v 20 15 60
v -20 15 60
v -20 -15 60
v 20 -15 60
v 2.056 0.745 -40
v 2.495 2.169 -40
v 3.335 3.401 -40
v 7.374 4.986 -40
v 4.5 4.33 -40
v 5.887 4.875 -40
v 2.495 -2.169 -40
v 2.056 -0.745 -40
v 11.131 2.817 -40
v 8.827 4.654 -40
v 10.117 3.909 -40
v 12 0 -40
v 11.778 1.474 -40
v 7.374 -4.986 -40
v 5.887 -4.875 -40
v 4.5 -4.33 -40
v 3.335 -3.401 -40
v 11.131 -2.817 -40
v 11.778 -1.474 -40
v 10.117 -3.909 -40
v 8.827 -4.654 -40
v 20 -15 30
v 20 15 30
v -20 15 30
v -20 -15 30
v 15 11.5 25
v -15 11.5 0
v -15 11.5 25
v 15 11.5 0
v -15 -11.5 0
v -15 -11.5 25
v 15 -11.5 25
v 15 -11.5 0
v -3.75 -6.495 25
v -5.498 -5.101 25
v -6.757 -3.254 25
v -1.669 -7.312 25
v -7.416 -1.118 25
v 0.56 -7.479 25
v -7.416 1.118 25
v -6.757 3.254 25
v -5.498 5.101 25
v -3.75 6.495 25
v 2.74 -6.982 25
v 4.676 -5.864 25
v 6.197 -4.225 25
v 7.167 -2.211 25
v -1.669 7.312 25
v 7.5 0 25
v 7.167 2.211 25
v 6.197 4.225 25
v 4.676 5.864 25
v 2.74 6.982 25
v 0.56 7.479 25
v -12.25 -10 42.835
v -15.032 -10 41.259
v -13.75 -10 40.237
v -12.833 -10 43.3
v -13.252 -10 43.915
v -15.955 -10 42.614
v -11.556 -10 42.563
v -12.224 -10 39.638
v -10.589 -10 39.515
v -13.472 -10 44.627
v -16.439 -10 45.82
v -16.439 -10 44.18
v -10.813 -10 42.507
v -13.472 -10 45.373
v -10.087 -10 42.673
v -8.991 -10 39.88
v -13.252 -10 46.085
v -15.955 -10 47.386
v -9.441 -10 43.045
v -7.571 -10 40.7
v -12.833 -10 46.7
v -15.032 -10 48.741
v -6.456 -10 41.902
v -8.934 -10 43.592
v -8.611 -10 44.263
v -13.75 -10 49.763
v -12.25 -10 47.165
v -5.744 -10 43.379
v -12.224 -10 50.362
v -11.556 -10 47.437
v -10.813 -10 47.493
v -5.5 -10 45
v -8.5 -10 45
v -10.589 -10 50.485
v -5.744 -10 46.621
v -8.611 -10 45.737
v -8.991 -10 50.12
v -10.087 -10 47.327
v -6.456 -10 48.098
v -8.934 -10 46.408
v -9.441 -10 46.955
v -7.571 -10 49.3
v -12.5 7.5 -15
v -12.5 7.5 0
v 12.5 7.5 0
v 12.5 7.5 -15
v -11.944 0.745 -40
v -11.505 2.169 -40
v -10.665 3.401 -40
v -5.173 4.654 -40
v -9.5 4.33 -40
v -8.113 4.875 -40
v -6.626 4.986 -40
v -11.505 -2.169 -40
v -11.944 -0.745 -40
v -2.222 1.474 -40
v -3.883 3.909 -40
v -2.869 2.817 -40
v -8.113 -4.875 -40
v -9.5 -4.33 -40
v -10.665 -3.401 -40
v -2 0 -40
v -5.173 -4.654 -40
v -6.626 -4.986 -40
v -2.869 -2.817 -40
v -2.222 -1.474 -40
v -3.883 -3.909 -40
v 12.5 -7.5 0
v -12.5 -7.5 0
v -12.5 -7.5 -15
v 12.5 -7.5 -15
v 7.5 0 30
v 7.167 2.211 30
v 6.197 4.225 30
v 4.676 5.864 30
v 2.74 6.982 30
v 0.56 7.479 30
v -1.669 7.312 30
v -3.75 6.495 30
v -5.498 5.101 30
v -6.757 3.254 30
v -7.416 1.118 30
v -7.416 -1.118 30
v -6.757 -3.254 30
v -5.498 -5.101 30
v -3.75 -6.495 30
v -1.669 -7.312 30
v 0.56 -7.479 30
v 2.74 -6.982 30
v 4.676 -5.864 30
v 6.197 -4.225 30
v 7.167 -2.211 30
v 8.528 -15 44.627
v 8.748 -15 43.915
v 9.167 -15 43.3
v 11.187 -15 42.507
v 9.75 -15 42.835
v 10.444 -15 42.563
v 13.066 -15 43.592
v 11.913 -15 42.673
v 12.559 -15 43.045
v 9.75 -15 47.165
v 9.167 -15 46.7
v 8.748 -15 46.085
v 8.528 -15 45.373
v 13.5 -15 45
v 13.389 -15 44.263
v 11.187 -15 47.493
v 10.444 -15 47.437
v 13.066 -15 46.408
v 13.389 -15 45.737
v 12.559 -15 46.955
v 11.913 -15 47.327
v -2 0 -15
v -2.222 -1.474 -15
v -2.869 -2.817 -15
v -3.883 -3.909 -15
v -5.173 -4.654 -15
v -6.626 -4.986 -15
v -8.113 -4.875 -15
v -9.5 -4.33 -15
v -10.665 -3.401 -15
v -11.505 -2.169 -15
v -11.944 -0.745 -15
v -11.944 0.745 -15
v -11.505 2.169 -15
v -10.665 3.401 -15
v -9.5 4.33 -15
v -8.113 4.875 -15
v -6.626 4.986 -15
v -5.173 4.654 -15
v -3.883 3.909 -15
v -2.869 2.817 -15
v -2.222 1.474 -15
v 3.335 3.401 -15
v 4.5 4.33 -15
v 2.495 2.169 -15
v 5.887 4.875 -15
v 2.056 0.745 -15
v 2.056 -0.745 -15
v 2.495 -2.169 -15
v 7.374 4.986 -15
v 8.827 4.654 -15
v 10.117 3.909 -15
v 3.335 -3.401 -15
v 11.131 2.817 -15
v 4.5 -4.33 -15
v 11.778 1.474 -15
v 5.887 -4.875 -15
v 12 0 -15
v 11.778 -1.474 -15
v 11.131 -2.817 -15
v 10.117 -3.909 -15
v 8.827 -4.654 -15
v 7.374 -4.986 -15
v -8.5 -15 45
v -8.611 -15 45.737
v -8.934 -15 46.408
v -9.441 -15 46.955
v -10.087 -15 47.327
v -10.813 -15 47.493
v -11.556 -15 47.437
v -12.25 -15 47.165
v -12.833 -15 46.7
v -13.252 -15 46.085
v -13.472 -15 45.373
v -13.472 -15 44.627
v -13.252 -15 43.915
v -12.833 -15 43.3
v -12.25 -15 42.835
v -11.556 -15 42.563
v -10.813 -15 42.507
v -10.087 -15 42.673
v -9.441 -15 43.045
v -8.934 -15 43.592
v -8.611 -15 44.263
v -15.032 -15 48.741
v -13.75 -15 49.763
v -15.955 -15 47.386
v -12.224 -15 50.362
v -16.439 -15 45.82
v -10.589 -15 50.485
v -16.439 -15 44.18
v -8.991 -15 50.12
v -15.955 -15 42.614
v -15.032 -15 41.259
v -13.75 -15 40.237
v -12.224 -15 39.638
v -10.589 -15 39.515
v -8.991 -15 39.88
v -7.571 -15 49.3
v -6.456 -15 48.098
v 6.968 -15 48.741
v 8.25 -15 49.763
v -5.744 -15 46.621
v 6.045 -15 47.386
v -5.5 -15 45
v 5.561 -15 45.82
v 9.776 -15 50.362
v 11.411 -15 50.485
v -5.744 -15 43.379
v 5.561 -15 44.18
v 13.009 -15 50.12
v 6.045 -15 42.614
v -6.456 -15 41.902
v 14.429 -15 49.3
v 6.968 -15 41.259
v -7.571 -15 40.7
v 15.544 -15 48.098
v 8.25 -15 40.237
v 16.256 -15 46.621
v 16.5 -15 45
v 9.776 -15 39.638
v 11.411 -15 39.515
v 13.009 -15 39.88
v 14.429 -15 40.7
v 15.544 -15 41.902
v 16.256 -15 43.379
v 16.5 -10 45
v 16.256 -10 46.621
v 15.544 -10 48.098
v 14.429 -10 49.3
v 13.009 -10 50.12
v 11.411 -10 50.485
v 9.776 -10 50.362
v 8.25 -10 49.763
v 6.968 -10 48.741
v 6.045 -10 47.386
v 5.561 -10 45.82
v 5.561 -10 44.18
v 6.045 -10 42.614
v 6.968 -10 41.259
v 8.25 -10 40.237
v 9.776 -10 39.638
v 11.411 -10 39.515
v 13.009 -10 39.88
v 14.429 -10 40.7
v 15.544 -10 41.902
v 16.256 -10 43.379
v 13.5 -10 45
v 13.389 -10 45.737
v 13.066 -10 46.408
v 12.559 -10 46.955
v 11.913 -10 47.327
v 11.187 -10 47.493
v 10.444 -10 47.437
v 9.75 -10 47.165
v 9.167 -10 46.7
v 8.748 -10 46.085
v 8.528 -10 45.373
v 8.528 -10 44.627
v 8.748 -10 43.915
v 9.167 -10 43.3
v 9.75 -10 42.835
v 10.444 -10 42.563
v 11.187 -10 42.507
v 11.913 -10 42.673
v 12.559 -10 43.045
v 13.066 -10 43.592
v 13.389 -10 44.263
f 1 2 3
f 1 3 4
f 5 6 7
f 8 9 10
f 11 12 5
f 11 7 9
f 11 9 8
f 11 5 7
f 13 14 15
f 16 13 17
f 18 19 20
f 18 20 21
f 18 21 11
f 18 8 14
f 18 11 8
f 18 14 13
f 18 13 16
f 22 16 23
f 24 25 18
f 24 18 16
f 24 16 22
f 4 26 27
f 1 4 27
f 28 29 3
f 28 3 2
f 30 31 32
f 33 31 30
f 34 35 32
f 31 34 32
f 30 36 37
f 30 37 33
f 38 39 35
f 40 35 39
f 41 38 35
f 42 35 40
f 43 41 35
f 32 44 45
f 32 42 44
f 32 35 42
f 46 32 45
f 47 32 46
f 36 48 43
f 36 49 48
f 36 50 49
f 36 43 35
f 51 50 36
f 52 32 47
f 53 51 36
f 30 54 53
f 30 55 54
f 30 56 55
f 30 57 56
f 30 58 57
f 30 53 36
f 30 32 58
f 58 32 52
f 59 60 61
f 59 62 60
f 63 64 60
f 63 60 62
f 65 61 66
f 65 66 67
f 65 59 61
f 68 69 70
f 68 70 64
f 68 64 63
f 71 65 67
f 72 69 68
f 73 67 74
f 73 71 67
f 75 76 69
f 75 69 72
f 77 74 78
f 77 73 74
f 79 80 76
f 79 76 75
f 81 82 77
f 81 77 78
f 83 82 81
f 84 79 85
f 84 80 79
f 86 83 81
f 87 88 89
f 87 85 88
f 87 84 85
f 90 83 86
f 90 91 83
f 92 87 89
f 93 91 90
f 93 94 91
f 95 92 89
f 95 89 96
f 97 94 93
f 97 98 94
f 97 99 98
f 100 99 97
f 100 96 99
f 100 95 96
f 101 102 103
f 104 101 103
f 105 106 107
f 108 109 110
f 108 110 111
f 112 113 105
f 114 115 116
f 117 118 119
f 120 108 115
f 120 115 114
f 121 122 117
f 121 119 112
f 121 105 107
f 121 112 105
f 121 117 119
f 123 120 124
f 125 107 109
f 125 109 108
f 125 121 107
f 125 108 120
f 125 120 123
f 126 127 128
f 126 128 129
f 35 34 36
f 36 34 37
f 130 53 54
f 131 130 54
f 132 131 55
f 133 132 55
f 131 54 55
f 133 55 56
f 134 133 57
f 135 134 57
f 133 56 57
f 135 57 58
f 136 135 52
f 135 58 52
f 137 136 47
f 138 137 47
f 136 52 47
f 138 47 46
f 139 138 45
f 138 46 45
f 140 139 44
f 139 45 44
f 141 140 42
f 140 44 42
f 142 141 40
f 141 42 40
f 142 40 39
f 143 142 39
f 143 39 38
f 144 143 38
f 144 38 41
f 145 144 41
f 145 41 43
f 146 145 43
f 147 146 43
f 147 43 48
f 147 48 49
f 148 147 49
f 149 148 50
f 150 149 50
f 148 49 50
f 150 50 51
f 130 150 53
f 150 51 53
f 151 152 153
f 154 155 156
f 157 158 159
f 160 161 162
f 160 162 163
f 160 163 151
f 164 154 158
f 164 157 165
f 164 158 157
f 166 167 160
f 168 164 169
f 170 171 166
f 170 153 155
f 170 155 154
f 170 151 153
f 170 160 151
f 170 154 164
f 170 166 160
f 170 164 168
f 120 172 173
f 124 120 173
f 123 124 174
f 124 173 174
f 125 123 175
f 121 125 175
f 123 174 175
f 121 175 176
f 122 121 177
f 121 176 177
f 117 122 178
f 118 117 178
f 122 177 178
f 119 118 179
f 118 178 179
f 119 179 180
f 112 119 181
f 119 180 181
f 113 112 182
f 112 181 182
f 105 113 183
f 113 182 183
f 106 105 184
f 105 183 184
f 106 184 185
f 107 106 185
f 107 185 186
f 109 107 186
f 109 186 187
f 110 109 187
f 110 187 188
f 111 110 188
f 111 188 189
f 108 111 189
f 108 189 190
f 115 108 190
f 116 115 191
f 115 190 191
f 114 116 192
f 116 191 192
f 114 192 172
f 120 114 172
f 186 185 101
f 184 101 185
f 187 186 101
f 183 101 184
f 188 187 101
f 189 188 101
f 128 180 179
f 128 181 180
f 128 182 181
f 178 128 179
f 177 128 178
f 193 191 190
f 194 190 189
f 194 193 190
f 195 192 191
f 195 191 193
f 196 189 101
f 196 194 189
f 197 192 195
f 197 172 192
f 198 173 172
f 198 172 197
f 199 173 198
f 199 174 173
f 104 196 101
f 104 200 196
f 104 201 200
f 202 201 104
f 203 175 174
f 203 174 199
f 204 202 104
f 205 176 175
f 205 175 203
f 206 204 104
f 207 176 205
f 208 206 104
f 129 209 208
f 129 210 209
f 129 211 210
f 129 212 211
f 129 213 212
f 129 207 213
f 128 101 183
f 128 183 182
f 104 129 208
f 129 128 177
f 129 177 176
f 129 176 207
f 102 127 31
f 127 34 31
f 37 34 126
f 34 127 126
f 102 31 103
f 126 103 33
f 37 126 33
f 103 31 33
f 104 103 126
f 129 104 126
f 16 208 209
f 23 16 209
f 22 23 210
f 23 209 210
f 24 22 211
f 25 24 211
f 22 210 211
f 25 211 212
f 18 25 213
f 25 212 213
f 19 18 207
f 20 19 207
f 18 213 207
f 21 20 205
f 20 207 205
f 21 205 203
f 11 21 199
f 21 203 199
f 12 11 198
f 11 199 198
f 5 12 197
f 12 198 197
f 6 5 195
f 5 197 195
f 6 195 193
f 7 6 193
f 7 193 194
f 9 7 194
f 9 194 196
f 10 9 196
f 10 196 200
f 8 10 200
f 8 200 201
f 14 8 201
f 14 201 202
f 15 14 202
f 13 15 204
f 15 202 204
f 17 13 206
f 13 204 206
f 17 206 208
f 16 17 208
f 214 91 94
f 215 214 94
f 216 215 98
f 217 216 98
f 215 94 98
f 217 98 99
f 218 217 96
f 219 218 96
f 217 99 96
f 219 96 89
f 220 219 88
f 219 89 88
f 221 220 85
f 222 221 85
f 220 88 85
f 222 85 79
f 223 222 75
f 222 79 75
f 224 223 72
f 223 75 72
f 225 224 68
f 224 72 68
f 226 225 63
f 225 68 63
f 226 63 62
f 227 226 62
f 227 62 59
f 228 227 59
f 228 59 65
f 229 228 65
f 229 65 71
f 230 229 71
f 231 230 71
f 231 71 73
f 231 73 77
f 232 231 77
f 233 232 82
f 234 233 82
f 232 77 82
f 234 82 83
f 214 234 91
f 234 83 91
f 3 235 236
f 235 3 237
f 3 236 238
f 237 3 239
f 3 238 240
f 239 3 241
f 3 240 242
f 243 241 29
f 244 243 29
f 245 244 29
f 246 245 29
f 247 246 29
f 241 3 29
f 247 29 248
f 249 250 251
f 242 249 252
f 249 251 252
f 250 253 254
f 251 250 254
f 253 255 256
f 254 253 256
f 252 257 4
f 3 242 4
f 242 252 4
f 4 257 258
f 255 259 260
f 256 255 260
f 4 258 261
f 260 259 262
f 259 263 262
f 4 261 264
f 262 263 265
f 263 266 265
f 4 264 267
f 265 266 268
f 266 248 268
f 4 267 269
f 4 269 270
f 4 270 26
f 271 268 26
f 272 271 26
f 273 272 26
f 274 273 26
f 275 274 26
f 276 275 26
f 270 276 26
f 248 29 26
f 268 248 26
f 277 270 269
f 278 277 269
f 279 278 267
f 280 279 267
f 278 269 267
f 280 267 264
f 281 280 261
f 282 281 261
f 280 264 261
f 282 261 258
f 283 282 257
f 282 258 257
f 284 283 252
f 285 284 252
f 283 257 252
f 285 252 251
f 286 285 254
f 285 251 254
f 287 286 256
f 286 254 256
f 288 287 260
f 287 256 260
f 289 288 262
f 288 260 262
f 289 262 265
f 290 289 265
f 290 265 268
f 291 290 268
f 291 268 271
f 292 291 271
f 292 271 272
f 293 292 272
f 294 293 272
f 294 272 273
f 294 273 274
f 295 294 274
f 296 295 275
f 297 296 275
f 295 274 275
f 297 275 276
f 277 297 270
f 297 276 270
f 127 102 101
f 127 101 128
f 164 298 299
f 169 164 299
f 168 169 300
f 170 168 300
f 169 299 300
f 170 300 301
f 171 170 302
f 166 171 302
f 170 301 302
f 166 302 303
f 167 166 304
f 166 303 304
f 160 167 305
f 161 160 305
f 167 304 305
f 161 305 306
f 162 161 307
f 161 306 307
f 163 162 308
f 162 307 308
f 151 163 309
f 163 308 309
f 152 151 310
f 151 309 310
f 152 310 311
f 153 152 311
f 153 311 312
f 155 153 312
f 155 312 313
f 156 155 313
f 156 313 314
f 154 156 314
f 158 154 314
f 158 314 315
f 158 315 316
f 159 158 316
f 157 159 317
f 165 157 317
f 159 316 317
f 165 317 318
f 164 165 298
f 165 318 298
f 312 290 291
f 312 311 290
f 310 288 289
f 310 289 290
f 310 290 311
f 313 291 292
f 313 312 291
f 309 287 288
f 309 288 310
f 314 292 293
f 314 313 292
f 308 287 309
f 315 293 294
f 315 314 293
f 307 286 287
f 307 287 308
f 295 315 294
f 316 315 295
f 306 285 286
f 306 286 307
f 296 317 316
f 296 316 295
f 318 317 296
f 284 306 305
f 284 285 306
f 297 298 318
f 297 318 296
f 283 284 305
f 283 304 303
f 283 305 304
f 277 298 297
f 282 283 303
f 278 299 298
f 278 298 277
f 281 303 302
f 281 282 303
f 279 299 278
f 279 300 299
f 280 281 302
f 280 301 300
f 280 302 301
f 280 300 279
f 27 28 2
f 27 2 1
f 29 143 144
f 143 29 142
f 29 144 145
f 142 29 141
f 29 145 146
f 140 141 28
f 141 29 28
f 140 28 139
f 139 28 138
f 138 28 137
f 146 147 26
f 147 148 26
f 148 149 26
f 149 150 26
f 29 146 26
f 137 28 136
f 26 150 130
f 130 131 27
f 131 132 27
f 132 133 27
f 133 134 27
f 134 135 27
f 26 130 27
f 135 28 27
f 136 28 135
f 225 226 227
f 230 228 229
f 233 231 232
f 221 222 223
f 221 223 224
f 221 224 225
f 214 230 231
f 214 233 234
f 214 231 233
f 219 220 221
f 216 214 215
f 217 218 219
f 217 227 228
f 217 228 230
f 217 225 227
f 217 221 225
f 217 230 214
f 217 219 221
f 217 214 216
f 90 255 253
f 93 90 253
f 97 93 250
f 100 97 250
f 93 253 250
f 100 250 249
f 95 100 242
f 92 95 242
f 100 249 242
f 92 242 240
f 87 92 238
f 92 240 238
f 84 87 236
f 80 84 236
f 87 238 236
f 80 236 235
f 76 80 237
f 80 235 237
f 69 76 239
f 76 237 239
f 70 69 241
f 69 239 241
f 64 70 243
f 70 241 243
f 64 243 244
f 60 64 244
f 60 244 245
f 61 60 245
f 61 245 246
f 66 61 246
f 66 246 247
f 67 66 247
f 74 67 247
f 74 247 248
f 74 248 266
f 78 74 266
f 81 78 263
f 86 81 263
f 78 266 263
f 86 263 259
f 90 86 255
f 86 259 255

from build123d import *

# Parameters (mm, degrees)
F0_W      = 30
F0_H      = 23
F1_DEPTH  = 25
F2_W      = 25
F2_H      = 15
F3_DEPTH  = 15
F4_R      = 5
F5_DEPTH  = 25
F6_R      = 7.5
F7_DEPTH  = 5
F8_W      = 40
F8_H      = 30
F9_DEPTH  = 30
F10_R     = 5.5
F11_DEPTH = 5
F12_R     = 2.5
F13_DEPTH = 5
F14_R     = 2.5
F15_DEPTH = 5


with BuildPart() as f1:
    # F0 (on Top) → F1 (new body)
    with BuildSketch(Plane.XY):
        Rectangle(F0_W, F0_H)
    extrude(amount=F1_DEPTH)

    # F2 (on face) → F3 (join)
    with BuildSketch(Plane(origin=(0, 0, 0), x_dir=(1, 0, 0), z_dir=(0, 0, -1))):
        Rectangle(F2_W, F2_H)
    extrude(amount=F3_DEPTH)

    # F4 (on face) → F5 (join)
    with BuildSketch(Plane(origin=(0, 0, -15), x_dir=(1, 0, 0), z_dir=(0, 0, -1))):
        with Locations((7, 0)):
            Circle(F4_R)
        with Locations((-7, 0)):
            Circle(F4_R)
    extrude(amount=F5_DEPTH)

    # F6 (on face) → F7 (join)
    with BuildSketch(Plane.XY.offset(25)):
        Circle(F6_R)
    extrude(amount=F7_DEPTH)

    # F8 (on face) → F9 (join)
    with BuildSketch(Plane.XY.offset(30)):
        Rectangle(F8_W, F8_H)
    extrude(amount=F9_DEPTH)

    # F10 (on face) → F11 (cut)
    with BuildSketch(Plane.XZ.offset(15)):
        with Locations((-11, 45)):
            Circle(F10_R)
        with Locations((11, 45)):
            Circle(F10_R)
    extrude(amount=-F11_DEPTH, mode=Mode.SUBTRACT)

    # F12 (on face) → F13 (join)
    with BuildSketch(Plane.XZ.offset(10)):
        with Locations((-11, 45)):
            Circle(F12_R)
    extrude(amount=F13_DEPTH)

    # F14 (on face) → F15 (join)
    with BuildSketch(Plane.XZ.offset(10)):
        with Locations((11, 45)):
            Circle(F14_R)
    extrude(amount=F15_DEPTH)


solid = f1.part
